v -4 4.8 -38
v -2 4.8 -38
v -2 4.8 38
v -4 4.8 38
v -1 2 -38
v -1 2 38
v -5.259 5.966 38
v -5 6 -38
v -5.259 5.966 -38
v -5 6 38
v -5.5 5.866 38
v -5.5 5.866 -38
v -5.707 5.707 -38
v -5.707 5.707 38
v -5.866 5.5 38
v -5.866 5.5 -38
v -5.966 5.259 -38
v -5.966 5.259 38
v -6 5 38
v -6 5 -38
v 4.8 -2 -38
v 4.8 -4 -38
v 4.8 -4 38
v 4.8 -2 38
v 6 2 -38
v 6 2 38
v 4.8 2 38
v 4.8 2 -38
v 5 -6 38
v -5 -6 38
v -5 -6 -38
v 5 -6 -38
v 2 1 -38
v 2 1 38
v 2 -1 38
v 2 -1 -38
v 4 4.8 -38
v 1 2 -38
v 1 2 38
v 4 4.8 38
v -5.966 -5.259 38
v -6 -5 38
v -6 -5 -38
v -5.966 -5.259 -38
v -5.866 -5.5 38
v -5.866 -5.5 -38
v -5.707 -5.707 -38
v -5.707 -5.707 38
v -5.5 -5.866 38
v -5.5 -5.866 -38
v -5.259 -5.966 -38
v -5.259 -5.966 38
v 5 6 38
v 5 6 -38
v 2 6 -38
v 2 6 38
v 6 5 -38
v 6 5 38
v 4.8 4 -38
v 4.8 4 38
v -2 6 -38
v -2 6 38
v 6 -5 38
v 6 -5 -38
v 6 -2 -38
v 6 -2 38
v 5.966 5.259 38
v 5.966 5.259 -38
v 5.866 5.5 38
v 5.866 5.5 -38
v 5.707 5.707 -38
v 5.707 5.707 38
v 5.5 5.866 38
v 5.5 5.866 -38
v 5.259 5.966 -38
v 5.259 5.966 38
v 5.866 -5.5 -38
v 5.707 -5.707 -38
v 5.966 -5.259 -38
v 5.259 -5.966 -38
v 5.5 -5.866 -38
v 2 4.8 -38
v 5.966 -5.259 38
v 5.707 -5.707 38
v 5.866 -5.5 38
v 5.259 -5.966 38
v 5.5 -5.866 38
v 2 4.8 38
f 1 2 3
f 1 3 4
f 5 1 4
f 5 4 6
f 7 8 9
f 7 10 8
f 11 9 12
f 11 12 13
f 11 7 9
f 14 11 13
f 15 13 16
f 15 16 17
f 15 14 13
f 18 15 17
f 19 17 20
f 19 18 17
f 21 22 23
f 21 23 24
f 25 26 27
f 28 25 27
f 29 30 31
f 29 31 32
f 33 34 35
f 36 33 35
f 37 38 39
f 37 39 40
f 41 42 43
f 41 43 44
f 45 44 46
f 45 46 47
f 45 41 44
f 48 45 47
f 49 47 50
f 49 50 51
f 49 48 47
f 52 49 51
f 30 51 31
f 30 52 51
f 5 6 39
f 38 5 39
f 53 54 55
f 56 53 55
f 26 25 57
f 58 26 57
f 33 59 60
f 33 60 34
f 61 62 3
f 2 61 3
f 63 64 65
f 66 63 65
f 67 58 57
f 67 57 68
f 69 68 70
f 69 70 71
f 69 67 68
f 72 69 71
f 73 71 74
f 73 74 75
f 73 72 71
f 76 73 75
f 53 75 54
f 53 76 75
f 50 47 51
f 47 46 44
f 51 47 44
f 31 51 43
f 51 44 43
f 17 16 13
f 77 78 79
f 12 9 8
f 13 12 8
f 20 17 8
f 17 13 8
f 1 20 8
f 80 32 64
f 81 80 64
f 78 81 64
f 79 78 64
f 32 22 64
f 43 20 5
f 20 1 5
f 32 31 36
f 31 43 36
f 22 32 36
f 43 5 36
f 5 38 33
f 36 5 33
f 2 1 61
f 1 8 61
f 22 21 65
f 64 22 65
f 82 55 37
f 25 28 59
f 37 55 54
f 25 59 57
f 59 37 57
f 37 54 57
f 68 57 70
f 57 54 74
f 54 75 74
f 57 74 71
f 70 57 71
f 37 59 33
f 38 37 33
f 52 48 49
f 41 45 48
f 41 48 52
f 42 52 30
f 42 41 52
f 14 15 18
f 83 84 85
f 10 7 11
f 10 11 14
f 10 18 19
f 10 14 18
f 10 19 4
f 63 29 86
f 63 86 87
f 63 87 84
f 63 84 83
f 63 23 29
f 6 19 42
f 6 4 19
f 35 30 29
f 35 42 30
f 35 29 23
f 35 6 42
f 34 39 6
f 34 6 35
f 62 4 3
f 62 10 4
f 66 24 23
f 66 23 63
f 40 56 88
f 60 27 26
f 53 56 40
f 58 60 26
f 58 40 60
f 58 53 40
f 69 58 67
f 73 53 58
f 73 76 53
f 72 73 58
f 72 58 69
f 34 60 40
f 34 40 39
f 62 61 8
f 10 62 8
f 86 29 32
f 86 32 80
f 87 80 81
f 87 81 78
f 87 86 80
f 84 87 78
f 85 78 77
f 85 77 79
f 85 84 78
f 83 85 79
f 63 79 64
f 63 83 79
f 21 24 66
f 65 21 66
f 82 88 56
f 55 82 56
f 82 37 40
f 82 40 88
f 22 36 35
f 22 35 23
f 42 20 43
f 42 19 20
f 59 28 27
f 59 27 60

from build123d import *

# Parameters (mm, degrees)
EXTRUSION1_DEPTH             = 38
ENL_V_MAT_EXTRU_1_DEPTH      = 77.472217177
R_P_TITION_CIRCULAIRE1_COUNT = 2
R_P_TITION_CIRCULAIRE1_ANGLE = 90


with BuildPart() as part:
    # Esquisse1 → Extrusion1 (new, symmetric)
    with BuildSketch(Plane.XY):
        with BuildLine():
            Line((-6, 5), (-6, -5))
            ThreePointArc((-6, -5), (-5.707106781, -5.707106781), (-5, -6))
            Line((-5, -6), (5, -6))
            ThreePointArc((5, -6), (5.707106781, -5.707106781), (6, -5))
            Line((6, -5), (6, 5))
            ThreePointArc((6, 5), (5.707106781, 5.707106781), (5, 6))
            Line((5, 6), (-5, 6))
            ThreePointArc((-5, 6), (-5.707106781, 5.707106781), (-6, 5))
        make_face()
    extrude(amount=EXTRUSION1_DEPTH, both=True)

    # Esquisse3 → Enlèv. mat.-Extru.1 (cut, through all)
    with BuildSketch(Plane.XY.offset(38)):
        Polygon((6, 2), (4.8, 2), (4.8, 4), (2, 1), (2, -1), (4.8, -4), (4.8, -2), (6, -2), align=None)
    enl_v_mat_extru_1 = extrude(amount=-ENL_V_MAT_EXTRU_1_DEPTH, mode=Mode.SUBTRACT)

    # Répétition circulaire1: Enlèv. mat.-Extru.1 ×2 about axis
    r_p_tition_circulaire1_axis = Axis((0, 0, -1), (0, 0, 1))
    for i in range(1, R_P_TITION_CIRCULAIRE1_COUNT):
        add(enl_v_mat_extru_1.rotate(r_p_tition_circulaire1_axis, i * R_P_TITION_CIRCULAIRE1_ANGLE / (R_P_TITION_CIRCULAIRE1_COUNT - 1)), mode=Mode.SUBTRACT)


solid = part.part
